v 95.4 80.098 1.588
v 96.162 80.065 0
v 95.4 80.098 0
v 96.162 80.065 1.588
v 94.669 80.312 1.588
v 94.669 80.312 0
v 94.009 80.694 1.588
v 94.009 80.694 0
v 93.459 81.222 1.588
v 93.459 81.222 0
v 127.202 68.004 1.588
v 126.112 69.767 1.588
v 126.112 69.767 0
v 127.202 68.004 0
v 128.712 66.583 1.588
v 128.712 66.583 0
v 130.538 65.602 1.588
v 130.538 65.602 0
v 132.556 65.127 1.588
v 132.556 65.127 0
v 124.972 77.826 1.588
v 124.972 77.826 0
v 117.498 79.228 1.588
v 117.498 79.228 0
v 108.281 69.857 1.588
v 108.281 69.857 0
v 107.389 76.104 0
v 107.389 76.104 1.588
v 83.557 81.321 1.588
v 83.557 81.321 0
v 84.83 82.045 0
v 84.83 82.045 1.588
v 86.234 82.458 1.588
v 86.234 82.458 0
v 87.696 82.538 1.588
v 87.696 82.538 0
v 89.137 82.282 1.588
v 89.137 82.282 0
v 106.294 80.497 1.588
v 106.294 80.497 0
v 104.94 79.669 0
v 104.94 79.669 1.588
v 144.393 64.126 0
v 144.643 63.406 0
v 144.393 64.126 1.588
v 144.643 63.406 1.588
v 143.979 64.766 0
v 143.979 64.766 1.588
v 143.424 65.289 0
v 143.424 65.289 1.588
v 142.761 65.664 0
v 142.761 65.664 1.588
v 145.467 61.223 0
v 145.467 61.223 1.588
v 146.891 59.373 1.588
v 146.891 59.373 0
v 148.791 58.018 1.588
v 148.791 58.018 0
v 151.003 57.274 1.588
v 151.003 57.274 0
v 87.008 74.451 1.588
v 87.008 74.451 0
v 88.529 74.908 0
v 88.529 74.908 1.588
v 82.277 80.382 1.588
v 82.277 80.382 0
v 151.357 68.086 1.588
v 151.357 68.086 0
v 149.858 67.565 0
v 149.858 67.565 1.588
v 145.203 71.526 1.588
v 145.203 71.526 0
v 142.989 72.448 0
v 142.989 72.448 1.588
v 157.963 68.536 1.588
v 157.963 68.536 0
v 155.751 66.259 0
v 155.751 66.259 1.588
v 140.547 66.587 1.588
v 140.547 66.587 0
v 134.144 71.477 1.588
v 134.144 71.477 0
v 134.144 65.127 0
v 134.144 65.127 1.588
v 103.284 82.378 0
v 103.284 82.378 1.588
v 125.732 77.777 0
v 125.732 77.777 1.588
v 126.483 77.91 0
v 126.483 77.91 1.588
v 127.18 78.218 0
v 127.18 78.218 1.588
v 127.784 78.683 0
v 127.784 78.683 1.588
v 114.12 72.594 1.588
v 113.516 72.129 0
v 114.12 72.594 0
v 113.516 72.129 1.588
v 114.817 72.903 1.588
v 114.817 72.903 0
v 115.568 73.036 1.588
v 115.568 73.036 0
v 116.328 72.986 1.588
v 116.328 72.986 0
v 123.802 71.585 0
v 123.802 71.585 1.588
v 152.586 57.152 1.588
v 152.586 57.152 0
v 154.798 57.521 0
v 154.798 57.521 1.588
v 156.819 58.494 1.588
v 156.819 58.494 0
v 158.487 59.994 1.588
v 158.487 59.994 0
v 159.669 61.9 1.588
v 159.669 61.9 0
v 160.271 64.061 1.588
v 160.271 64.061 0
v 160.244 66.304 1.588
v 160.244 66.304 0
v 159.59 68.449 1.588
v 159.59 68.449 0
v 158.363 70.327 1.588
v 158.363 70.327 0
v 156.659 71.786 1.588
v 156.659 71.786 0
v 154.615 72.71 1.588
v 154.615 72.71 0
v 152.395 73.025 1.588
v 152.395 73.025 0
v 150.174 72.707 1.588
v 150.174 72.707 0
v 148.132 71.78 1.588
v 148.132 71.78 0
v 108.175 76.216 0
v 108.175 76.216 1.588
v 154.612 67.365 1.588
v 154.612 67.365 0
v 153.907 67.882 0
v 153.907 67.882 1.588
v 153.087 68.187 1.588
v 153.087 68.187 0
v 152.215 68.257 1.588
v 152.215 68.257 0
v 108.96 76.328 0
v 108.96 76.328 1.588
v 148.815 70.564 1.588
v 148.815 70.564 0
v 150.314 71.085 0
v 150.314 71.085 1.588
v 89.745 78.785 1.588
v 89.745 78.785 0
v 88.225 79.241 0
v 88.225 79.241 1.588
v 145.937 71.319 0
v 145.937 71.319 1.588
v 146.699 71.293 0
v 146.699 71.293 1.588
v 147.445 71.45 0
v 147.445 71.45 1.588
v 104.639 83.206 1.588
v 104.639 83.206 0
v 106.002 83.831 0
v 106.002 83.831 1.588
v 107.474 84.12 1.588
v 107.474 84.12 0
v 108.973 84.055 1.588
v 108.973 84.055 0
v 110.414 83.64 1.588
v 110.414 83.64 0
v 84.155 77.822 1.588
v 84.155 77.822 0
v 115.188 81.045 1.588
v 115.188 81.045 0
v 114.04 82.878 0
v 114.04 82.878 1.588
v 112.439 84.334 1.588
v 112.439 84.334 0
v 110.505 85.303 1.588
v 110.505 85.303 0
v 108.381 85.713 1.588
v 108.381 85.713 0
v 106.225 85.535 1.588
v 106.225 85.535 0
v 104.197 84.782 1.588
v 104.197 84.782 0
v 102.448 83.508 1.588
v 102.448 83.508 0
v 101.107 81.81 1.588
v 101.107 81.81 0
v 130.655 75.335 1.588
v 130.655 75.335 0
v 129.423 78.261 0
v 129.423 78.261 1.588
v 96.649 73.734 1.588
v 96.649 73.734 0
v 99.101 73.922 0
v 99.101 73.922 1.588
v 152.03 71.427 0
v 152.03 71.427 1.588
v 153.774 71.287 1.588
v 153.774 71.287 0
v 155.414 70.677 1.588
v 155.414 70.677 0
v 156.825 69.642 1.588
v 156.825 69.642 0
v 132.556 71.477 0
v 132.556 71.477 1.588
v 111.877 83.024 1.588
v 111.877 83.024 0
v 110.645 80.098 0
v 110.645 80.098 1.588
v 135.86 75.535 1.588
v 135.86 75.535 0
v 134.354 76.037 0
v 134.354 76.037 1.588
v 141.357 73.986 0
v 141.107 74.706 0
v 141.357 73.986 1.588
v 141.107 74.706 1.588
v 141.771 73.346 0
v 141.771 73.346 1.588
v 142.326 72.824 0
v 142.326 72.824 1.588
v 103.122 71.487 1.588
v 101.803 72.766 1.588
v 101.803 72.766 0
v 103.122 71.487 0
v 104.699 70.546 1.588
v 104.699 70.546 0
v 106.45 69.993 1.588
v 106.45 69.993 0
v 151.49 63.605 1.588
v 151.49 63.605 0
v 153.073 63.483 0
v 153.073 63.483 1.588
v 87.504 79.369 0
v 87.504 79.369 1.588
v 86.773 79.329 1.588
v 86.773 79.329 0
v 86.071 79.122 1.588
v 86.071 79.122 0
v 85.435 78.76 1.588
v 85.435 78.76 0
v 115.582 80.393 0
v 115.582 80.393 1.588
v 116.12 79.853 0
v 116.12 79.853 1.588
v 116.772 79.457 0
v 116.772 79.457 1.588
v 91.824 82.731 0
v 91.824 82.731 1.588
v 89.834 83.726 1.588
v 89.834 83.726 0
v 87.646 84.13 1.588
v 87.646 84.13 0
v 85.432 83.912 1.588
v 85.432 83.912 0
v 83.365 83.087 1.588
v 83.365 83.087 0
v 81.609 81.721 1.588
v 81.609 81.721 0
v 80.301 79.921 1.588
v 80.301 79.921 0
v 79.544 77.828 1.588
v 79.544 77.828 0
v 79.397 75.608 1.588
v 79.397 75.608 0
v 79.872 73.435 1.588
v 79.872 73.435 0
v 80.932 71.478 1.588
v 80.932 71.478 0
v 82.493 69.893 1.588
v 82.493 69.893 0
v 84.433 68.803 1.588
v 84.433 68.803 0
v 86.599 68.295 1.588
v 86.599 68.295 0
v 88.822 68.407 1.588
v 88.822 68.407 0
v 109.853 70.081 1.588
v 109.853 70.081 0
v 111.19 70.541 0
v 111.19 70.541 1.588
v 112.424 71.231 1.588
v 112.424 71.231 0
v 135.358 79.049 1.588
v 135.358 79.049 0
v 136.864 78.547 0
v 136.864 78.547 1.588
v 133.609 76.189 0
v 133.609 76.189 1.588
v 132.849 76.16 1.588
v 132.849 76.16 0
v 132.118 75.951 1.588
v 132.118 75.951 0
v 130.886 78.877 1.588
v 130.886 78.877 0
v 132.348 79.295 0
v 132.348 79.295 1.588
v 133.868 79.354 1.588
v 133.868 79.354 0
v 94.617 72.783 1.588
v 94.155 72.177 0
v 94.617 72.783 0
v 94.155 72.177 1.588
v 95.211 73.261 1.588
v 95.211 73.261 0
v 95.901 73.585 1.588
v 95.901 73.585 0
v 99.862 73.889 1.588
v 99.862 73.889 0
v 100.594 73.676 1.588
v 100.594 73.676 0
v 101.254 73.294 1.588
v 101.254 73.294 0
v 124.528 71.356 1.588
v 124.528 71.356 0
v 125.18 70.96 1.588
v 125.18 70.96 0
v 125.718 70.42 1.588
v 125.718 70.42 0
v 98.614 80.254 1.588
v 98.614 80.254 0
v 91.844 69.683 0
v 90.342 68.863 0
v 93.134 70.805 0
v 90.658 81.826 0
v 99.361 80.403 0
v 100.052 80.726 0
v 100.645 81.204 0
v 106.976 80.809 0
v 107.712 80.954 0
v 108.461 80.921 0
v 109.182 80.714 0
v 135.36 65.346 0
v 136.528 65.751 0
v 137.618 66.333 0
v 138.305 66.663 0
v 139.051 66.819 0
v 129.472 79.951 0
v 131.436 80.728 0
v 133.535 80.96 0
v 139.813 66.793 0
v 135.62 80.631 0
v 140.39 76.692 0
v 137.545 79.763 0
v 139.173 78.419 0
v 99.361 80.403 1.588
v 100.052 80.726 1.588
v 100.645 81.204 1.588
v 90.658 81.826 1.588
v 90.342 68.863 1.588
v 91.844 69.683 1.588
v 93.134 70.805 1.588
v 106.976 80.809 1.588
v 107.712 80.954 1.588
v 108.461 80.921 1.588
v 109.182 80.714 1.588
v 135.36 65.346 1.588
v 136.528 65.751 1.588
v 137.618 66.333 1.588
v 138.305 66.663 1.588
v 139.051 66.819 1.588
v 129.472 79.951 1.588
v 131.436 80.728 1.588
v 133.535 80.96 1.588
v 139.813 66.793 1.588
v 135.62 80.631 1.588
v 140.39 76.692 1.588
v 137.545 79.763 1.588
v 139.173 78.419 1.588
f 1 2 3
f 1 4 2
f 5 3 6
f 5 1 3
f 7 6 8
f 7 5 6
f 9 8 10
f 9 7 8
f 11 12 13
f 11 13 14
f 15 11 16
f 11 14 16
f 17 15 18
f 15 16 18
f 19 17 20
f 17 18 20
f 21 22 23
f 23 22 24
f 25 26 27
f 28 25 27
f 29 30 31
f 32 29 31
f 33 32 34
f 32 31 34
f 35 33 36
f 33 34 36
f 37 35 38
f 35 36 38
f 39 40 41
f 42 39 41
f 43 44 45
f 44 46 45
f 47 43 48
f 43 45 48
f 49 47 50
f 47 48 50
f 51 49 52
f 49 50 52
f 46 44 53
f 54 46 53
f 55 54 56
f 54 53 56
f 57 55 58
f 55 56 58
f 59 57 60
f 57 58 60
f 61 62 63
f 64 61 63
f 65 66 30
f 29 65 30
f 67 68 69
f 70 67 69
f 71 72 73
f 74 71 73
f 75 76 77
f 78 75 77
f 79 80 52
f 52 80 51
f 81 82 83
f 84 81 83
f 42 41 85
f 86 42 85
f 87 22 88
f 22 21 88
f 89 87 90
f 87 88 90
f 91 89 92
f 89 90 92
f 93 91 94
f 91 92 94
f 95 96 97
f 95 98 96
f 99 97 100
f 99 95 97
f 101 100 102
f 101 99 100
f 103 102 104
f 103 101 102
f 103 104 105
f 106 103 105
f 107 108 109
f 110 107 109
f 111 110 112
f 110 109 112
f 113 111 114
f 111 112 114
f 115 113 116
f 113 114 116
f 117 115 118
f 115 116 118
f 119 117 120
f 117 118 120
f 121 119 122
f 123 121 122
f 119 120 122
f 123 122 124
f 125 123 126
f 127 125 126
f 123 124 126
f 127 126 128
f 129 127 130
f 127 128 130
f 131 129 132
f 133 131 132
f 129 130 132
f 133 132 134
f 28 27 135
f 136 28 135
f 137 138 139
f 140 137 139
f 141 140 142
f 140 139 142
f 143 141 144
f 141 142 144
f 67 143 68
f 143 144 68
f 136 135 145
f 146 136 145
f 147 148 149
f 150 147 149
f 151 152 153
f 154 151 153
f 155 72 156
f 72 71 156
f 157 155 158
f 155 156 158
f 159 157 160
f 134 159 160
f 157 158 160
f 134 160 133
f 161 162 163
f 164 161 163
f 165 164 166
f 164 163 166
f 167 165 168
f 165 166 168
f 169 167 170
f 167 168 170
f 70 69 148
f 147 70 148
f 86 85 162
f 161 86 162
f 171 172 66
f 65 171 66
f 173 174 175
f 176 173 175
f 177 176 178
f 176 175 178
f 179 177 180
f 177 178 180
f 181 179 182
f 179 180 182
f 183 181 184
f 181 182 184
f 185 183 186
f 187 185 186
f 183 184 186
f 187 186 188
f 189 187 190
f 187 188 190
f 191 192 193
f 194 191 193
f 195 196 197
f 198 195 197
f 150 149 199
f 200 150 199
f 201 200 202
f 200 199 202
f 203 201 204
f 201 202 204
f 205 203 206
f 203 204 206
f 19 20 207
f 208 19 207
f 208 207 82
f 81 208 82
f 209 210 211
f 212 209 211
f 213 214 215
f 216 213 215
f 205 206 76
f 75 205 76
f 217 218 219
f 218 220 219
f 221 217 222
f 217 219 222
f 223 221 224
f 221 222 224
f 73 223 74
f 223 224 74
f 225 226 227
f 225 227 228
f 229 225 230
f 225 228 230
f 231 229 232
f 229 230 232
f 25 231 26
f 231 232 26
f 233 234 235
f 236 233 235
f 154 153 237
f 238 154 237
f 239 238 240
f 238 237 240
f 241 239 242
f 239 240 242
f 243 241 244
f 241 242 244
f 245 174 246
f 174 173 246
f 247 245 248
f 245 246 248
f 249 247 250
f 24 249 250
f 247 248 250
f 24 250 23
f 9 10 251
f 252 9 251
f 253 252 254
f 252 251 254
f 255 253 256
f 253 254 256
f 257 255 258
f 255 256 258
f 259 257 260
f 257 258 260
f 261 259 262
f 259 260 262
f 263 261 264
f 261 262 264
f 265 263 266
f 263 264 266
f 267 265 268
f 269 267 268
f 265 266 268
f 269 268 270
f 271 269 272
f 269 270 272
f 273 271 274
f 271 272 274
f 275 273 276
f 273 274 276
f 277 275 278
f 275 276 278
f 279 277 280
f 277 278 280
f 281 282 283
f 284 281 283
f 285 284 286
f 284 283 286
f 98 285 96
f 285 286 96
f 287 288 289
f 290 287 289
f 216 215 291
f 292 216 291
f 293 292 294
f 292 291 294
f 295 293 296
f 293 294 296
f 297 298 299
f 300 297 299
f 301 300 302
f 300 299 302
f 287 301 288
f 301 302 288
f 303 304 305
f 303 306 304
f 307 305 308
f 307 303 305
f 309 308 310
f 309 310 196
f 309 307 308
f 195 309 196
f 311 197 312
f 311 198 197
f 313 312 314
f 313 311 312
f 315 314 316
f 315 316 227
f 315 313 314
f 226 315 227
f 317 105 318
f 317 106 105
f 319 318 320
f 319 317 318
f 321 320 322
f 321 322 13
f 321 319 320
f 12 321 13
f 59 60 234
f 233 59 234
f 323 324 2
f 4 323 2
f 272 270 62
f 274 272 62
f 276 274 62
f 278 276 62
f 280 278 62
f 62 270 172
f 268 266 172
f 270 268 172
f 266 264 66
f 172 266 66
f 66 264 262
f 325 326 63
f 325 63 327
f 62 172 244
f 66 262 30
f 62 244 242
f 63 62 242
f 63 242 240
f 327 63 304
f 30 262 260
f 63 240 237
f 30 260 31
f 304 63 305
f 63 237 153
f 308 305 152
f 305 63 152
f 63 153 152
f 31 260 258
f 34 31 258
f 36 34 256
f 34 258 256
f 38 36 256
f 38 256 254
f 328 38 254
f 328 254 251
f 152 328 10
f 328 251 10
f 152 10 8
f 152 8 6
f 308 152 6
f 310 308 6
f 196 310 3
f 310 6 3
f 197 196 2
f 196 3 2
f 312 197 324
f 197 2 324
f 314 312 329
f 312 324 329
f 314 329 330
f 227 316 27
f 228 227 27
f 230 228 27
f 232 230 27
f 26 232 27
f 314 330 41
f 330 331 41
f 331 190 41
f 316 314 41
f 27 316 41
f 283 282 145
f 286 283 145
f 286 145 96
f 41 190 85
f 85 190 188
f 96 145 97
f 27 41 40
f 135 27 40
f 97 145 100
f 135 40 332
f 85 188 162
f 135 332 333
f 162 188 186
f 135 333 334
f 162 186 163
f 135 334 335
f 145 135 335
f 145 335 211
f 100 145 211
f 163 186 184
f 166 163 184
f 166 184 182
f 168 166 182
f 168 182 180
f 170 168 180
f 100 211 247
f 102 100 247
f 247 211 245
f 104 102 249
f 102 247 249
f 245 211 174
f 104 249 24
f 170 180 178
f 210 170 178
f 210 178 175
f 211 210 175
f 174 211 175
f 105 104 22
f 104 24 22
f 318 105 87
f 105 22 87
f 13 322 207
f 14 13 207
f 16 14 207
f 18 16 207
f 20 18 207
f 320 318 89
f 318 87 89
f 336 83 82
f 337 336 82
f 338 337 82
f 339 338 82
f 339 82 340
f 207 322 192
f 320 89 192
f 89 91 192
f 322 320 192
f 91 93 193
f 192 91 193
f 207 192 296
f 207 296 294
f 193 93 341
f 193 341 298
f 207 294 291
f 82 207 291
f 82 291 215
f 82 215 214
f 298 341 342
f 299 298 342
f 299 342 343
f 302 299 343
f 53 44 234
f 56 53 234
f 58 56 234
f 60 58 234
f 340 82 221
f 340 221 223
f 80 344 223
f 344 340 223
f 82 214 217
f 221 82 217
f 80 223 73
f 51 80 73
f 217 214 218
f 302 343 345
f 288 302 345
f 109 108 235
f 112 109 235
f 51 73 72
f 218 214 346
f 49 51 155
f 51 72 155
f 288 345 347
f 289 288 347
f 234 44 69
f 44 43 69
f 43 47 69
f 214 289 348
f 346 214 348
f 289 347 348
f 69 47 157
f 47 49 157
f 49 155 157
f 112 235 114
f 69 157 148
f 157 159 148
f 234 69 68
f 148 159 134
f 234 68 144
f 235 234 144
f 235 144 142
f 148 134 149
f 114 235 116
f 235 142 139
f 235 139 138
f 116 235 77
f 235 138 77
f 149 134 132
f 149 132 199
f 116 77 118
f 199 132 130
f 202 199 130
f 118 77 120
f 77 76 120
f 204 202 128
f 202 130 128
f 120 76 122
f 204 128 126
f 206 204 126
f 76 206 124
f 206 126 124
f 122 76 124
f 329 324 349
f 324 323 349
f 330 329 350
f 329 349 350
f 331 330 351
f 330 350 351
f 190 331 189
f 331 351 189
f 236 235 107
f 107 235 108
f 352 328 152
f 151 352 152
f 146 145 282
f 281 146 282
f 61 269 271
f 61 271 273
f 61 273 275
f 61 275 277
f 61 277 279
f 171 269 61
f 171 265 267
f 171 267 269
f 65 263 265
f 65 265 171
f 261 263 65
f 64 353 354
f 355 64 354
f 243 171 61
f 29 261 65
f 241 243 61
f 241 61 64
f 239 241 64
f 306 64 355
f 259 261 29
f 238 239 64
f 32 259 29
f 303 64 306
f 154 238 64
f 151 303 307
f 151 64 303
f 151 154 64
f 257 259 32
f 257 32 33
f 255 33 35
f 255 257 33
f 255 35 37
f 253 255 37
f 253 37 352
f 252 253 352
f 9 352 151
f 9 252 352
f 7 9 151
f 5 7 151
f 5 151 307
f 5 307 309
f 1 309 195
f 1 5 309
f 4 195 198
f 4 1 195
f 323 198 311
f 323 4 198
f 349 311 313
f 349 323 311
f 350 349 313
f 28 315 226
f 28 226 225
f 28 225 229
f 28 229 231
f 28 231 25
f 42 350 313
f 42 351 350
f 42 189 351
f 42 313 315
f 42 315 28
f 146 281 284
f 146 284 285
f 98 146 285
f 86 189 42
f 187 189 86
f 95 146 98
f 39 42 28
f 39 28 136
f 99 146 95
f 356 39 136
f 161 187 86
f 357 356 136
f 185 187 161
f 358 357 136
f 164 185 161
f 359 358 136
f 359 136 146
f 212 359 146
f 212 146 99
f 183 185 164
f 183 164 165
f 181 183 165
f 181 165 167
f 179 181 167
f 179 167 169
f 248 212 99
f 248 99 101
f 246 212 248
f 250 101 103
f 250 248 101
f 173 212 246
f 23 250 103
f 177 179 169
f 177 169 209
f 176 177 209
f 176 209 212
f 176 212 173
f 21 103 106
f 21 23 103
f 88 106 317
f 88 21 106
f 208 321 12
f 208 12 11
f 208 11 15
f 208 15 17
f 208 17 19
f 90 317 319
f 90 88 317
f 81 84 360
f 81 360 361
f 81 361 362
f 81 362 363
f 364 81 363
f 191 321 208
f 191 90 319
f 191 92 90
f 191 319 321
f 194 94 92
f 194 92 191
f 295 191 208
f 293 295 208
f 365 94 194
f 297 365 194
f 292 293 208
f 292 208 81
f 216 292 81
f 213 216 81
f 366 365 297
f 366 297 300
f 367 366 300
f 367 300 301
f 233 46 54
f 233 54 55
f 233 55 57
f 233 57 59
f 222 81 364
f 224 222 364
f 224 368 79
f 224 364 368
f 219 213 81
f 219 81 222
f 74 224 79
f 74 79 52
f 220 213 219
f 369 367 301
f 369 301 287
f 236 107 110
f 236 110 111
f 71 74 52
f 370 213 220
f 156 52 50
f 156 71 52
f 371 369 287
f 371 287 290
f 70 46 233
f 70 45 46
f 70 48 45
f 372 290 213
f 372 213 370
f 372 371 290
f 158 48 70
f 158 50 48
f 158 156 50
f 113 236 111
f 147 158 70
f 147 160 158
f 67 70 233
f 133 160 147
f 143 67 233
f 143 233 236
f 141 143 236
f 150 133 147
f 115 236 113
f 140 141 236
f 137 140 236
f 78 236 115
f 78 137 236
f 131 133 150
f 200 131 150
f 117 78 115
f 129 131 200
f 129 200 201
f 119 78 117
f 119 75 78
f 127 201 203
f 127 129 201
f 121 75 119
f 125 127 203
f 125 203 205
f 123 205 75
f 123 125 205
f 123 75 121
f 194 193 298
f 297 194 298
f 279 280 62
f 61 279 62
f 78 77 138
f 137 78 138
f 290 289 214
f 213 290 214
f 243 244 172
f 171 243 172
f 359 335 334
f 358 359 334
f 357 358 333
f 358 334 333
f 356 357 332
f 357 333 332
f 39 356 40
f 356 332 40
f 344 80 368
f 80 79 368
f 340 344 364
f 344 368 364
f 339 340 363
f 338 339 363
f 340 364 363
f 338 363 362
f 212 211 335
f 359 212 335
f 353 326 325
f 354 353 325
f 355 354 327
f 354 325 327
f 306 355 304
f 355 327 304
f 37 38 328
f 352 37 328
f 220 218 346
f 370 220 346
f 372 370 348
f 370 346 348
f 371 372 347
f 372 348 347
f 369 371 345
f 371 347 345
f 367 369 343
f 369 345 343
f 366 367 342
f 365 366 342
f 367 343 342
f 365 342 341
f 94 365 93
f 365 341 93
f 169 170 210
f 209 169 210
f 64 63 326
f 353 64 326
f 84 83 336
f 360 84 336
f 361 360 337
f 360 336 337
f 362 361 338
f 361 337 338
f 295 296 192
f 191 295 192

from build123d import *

# Parameters (mm, degrees)
BOSS_EXTRUDE1_DEPTH = 1.5875
FILLET1_R           = 3.175


with BuildPart() as part:
    # Sketch4 → Boss-Extrude1 (new body)
    with BuildSketch(Plane.XY):
        with BuildLine():
            Line((100.453077844, 80.395193317), (94.322399388, 79.923602666))
            ThreePointArc((94.322399388, 79.923602666), (80.150110348, 79.621122729), (88.821616455, 68.40728072))
            Line((88.821616455, 68.40728072), (87.008390154, 74.451368388))
            Line((87.008390154, 74.451368388), (87.768664768, 74.679450772))
            Line((87.768664768, 74.679450772), (88.528939382, 74.907533156))
            Line((88.528939382, 74.907533156), (90.342165683, 68.863445488))
            ThreePointArc((90.342165683, 68.863445488), (93.082490895, 70.749210028), (94.809422156, 73.592306683))
            Line((94.809422156, 73.592306683), (100.940100612, 74.063897334))
            ThreePointArc((100.940100612, 74.063897334), (104.003334801, 70.900719906), (108.281132842, 69.856910029))
            Line((108.281132842, 69.856910029), (107.388733992, 76.103701977))
            Line((107.388733992, 76.103701977), (108.174506403, 76.215955179))
            Line((108.174506403, 76.215955179), (108.960278814, 76.32820838))
            Line((108.960278814, 76.32820838), (109.852677663, 70.081416432))
            ThreePointArc((109.852677663, 70.081416432), (112.484101458, 71.272453552), (114.515120736, 73.3262114))
            Line((114.515120736, 73.3262114), (125.614647067, 71.245050213))
            ThreePointArc((125.614647067, 71.245050213), (128.101842683, 67.070106968), (132.55625, 65.127287218))
            Line((132.55625, 65.127287218), (132.55625, 71.477287218))
            Line((132.55625, 71.477287218), (133.35, 71.477287218))
            Line((133.35, 71.477287218), (134.14375, 71.477287218))
            Line((134.14375, 71.477287218), (134.14375, 65.127287218))
            ThreePointArc((134.14375, 65.127287218), (136.675698551, 65.817806691), (138.844082076, 67.296215802))
            Line((138.844082076, 67.296215802), (144.463610232, 64.954745737))
            ThreePointArc((144.463610232, 64.954745737), (146.356207306, 59.941970278), (151.002861083, 57.273927891))
            Line((151.002861083, 57.273927891), (151.48988385, 63.605223874))
            Line((151.48988385, 63.605223874), (152.281295848, 63.544346028))
            Line((152.281295848, 63.544346028), (153.072707846, 63.483468182))
            Line((153.072707846, 63.483468182), (152.585685078, 57.152172199))
            ThreePointArc((152.585685078, 57.152172199), (159.729512866, 68.134161681), (146.905917924, 70.816284198))
            Line((146.905917924, 70.816284198), (141.286389768, 73.157754263))
            ThreePointArc((141.286389768, 73.157754263), (135.620274668, 80.630902917), (126.784879264, 77.4862886))
            Line((126.784879264, 77.4862886), (115.685352934, 79.567449787))
            ThreePointArc((115.685352934, 79.567449787), (108.380699601, 85.713306212), (100.453077844, 80.395193317))
        make_face()
        with BuildLine():
            ThreePointArc((134.354023157, 76.037069471), (133.228154551, 76.197661136), (132.117919025, 75.951192316))
            Line((132.117919025, 75.951192316), (130.654822867, 75.335151828))
            Line((130.654822867, 75.335151828), (129.422741892, 78.261344145))
            Line((129.422741892, 78.261344145), (130.88583805, 78.877384632))
            ThreePointArc((130.88583805, 78.877384632), (133.106309101, 79.370322273), (135.358046314, 79.049138943))
            Line((135.358046314, 79.049138943), (136.86408105, 78.547127364))
            Line((136.86408105, 78.547127364), (135.860057893, 75.535057893))
            Line((135.860057893, 75.535057893), (134.354023157, 76.037069471))
        make_face(mode=Mode.SUBTRACT)
        with BuildLine():
            ThreePointArc((83.557340736, 81.320671724), (86.234149214, 82.457767939), (89.137159073, 82.282196911))
            Line((89.137159073, 82.282196911), (90.657708301, 81.826032143))
            Line((90.657708301, 81.826032143), (89.745378764, 78.784933687))
            Line((89.745378764, 78.784933687), (88.224829537, 79.241098456))
            ThreePointArc((88.224829537, 79.241098456), (86.773324607, 79.32888397), (85.434920368, 78.760335862))
            Line((85.434920368, 78.760335862), (84.154752437, 77.821546046))
            Line((84.154752437, 77.821546046), (82.277172805, 80.381881908))
            Line((82.277172805, 80.381881908), (83.557340736, 81.320671724))
        make_face(mode=Mode.SUBTRACT)
        with BuildLine():
            ThreePointArc((109.182080975, 80.713692316), (107.712055506, 80.953571291), (106.29439622, 80.496669822))
            Line((106.29439622, 80.496669822), (104.939811309, 79.668867932))
            Line((104.939811309, 79.668867932), (103.284207529, 82.378037754))
            Line((103.284207529, 82.378037754), (104.63879244, 83.205839644))
            ThreePointArc((104.63879244, 83.205839644), (107.474111012, 84.119642581), (110.41416195, 83.639884632))
            Line((110.41416195, 83.639884632), (111.877258108, 83.023844145))
            Line((111.877258108, 83.023844145), (110.645177133, 80.097651828))
            Line((110.645177133, 80.097651828), (109.182080975, 80.713692316))
        make_face(mode=Mode.SUBTRACT)
        with BuildLine():
            ThreePointArc((154.612294548, 67.364862034), (153.086943568, 68.187295725), (151.356947016, 68.08627733))
            Line((151.356947016, 68.08627733), (149.857558351, 67.564750837))
            Line((149.857558351, 67.564750837), (148.814505367, 70.563528167))
            Line((148.814505367, 70.563528167), (150.313894032, 71.085054659))
            ThreePointArc((150.313894032, 71.085054659), (153.773887136, 71.287091449), (156.824589095, 69.642224068))
            Line((156.824589095, 69.642224068), (157.963270112, 68.536076795))
            Line((157.963270112, 68.536076795), (155.750975565, 66.25871476))
            Line((155.750975565, 66.25871476), (154.612294548, 67.364862034))
        make_face(mode=Mode.SUBTRACT)
    extrude(amount=BOSS_EXTRUDE1_DEPTH)

    # Fillet1
    fillet1_edges = [part.edges().sort_by_distance(p)[0] for p in [
        (94.322399388, 79.923602666, 0.79375),
        (100.453077844, 80.395193317, 0.79375),
        (115.685352934, 79.567449787, 0.79375),
        (126.784879264, 77.4862886, 0.79375),
        (141.286389768, 73.157754263, 0.79375),
        (146.905917924, 70.816284198, 0.79375),
        (144.463610232, 64.954745737, 0.79375),
        (138.844082076, 67.296215802, 0.79375),
        (125.614647067, 71.245050213, 0.79375),
        (114.515120736, 73.3262114, 0.79375),
        (100.940100612, 74.063897334, 0.79375),
        (94.809422156, 73.592306683, 0.79375),
    ]]
    fillet(fillet1_edges, radius=FILLET1_R)


solid = part.part
